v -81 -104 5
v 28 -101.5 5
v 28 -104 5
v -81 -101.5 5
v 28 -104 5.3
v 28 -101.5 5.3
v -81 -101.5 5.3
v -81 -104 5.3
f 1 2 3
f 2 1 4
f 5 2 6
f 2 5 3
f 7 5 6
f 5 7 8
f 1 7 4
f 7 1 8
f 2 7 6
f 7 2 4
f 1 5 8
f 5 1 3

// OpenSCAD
// The X rack (on the X carriage's -Y face) must reach the carriage's bottom
// face so it prints without supports: material in a thin slab at the bed,
// in front of the -Y face. Must render non-empty.
include <../axes.scad>
intersection() {
    x_carriage();
    translate([xc_x0 + 5, xc_y0 - 3, xc_z0]) cube([xc_len - 10, 2.5, 0.3]);
}
